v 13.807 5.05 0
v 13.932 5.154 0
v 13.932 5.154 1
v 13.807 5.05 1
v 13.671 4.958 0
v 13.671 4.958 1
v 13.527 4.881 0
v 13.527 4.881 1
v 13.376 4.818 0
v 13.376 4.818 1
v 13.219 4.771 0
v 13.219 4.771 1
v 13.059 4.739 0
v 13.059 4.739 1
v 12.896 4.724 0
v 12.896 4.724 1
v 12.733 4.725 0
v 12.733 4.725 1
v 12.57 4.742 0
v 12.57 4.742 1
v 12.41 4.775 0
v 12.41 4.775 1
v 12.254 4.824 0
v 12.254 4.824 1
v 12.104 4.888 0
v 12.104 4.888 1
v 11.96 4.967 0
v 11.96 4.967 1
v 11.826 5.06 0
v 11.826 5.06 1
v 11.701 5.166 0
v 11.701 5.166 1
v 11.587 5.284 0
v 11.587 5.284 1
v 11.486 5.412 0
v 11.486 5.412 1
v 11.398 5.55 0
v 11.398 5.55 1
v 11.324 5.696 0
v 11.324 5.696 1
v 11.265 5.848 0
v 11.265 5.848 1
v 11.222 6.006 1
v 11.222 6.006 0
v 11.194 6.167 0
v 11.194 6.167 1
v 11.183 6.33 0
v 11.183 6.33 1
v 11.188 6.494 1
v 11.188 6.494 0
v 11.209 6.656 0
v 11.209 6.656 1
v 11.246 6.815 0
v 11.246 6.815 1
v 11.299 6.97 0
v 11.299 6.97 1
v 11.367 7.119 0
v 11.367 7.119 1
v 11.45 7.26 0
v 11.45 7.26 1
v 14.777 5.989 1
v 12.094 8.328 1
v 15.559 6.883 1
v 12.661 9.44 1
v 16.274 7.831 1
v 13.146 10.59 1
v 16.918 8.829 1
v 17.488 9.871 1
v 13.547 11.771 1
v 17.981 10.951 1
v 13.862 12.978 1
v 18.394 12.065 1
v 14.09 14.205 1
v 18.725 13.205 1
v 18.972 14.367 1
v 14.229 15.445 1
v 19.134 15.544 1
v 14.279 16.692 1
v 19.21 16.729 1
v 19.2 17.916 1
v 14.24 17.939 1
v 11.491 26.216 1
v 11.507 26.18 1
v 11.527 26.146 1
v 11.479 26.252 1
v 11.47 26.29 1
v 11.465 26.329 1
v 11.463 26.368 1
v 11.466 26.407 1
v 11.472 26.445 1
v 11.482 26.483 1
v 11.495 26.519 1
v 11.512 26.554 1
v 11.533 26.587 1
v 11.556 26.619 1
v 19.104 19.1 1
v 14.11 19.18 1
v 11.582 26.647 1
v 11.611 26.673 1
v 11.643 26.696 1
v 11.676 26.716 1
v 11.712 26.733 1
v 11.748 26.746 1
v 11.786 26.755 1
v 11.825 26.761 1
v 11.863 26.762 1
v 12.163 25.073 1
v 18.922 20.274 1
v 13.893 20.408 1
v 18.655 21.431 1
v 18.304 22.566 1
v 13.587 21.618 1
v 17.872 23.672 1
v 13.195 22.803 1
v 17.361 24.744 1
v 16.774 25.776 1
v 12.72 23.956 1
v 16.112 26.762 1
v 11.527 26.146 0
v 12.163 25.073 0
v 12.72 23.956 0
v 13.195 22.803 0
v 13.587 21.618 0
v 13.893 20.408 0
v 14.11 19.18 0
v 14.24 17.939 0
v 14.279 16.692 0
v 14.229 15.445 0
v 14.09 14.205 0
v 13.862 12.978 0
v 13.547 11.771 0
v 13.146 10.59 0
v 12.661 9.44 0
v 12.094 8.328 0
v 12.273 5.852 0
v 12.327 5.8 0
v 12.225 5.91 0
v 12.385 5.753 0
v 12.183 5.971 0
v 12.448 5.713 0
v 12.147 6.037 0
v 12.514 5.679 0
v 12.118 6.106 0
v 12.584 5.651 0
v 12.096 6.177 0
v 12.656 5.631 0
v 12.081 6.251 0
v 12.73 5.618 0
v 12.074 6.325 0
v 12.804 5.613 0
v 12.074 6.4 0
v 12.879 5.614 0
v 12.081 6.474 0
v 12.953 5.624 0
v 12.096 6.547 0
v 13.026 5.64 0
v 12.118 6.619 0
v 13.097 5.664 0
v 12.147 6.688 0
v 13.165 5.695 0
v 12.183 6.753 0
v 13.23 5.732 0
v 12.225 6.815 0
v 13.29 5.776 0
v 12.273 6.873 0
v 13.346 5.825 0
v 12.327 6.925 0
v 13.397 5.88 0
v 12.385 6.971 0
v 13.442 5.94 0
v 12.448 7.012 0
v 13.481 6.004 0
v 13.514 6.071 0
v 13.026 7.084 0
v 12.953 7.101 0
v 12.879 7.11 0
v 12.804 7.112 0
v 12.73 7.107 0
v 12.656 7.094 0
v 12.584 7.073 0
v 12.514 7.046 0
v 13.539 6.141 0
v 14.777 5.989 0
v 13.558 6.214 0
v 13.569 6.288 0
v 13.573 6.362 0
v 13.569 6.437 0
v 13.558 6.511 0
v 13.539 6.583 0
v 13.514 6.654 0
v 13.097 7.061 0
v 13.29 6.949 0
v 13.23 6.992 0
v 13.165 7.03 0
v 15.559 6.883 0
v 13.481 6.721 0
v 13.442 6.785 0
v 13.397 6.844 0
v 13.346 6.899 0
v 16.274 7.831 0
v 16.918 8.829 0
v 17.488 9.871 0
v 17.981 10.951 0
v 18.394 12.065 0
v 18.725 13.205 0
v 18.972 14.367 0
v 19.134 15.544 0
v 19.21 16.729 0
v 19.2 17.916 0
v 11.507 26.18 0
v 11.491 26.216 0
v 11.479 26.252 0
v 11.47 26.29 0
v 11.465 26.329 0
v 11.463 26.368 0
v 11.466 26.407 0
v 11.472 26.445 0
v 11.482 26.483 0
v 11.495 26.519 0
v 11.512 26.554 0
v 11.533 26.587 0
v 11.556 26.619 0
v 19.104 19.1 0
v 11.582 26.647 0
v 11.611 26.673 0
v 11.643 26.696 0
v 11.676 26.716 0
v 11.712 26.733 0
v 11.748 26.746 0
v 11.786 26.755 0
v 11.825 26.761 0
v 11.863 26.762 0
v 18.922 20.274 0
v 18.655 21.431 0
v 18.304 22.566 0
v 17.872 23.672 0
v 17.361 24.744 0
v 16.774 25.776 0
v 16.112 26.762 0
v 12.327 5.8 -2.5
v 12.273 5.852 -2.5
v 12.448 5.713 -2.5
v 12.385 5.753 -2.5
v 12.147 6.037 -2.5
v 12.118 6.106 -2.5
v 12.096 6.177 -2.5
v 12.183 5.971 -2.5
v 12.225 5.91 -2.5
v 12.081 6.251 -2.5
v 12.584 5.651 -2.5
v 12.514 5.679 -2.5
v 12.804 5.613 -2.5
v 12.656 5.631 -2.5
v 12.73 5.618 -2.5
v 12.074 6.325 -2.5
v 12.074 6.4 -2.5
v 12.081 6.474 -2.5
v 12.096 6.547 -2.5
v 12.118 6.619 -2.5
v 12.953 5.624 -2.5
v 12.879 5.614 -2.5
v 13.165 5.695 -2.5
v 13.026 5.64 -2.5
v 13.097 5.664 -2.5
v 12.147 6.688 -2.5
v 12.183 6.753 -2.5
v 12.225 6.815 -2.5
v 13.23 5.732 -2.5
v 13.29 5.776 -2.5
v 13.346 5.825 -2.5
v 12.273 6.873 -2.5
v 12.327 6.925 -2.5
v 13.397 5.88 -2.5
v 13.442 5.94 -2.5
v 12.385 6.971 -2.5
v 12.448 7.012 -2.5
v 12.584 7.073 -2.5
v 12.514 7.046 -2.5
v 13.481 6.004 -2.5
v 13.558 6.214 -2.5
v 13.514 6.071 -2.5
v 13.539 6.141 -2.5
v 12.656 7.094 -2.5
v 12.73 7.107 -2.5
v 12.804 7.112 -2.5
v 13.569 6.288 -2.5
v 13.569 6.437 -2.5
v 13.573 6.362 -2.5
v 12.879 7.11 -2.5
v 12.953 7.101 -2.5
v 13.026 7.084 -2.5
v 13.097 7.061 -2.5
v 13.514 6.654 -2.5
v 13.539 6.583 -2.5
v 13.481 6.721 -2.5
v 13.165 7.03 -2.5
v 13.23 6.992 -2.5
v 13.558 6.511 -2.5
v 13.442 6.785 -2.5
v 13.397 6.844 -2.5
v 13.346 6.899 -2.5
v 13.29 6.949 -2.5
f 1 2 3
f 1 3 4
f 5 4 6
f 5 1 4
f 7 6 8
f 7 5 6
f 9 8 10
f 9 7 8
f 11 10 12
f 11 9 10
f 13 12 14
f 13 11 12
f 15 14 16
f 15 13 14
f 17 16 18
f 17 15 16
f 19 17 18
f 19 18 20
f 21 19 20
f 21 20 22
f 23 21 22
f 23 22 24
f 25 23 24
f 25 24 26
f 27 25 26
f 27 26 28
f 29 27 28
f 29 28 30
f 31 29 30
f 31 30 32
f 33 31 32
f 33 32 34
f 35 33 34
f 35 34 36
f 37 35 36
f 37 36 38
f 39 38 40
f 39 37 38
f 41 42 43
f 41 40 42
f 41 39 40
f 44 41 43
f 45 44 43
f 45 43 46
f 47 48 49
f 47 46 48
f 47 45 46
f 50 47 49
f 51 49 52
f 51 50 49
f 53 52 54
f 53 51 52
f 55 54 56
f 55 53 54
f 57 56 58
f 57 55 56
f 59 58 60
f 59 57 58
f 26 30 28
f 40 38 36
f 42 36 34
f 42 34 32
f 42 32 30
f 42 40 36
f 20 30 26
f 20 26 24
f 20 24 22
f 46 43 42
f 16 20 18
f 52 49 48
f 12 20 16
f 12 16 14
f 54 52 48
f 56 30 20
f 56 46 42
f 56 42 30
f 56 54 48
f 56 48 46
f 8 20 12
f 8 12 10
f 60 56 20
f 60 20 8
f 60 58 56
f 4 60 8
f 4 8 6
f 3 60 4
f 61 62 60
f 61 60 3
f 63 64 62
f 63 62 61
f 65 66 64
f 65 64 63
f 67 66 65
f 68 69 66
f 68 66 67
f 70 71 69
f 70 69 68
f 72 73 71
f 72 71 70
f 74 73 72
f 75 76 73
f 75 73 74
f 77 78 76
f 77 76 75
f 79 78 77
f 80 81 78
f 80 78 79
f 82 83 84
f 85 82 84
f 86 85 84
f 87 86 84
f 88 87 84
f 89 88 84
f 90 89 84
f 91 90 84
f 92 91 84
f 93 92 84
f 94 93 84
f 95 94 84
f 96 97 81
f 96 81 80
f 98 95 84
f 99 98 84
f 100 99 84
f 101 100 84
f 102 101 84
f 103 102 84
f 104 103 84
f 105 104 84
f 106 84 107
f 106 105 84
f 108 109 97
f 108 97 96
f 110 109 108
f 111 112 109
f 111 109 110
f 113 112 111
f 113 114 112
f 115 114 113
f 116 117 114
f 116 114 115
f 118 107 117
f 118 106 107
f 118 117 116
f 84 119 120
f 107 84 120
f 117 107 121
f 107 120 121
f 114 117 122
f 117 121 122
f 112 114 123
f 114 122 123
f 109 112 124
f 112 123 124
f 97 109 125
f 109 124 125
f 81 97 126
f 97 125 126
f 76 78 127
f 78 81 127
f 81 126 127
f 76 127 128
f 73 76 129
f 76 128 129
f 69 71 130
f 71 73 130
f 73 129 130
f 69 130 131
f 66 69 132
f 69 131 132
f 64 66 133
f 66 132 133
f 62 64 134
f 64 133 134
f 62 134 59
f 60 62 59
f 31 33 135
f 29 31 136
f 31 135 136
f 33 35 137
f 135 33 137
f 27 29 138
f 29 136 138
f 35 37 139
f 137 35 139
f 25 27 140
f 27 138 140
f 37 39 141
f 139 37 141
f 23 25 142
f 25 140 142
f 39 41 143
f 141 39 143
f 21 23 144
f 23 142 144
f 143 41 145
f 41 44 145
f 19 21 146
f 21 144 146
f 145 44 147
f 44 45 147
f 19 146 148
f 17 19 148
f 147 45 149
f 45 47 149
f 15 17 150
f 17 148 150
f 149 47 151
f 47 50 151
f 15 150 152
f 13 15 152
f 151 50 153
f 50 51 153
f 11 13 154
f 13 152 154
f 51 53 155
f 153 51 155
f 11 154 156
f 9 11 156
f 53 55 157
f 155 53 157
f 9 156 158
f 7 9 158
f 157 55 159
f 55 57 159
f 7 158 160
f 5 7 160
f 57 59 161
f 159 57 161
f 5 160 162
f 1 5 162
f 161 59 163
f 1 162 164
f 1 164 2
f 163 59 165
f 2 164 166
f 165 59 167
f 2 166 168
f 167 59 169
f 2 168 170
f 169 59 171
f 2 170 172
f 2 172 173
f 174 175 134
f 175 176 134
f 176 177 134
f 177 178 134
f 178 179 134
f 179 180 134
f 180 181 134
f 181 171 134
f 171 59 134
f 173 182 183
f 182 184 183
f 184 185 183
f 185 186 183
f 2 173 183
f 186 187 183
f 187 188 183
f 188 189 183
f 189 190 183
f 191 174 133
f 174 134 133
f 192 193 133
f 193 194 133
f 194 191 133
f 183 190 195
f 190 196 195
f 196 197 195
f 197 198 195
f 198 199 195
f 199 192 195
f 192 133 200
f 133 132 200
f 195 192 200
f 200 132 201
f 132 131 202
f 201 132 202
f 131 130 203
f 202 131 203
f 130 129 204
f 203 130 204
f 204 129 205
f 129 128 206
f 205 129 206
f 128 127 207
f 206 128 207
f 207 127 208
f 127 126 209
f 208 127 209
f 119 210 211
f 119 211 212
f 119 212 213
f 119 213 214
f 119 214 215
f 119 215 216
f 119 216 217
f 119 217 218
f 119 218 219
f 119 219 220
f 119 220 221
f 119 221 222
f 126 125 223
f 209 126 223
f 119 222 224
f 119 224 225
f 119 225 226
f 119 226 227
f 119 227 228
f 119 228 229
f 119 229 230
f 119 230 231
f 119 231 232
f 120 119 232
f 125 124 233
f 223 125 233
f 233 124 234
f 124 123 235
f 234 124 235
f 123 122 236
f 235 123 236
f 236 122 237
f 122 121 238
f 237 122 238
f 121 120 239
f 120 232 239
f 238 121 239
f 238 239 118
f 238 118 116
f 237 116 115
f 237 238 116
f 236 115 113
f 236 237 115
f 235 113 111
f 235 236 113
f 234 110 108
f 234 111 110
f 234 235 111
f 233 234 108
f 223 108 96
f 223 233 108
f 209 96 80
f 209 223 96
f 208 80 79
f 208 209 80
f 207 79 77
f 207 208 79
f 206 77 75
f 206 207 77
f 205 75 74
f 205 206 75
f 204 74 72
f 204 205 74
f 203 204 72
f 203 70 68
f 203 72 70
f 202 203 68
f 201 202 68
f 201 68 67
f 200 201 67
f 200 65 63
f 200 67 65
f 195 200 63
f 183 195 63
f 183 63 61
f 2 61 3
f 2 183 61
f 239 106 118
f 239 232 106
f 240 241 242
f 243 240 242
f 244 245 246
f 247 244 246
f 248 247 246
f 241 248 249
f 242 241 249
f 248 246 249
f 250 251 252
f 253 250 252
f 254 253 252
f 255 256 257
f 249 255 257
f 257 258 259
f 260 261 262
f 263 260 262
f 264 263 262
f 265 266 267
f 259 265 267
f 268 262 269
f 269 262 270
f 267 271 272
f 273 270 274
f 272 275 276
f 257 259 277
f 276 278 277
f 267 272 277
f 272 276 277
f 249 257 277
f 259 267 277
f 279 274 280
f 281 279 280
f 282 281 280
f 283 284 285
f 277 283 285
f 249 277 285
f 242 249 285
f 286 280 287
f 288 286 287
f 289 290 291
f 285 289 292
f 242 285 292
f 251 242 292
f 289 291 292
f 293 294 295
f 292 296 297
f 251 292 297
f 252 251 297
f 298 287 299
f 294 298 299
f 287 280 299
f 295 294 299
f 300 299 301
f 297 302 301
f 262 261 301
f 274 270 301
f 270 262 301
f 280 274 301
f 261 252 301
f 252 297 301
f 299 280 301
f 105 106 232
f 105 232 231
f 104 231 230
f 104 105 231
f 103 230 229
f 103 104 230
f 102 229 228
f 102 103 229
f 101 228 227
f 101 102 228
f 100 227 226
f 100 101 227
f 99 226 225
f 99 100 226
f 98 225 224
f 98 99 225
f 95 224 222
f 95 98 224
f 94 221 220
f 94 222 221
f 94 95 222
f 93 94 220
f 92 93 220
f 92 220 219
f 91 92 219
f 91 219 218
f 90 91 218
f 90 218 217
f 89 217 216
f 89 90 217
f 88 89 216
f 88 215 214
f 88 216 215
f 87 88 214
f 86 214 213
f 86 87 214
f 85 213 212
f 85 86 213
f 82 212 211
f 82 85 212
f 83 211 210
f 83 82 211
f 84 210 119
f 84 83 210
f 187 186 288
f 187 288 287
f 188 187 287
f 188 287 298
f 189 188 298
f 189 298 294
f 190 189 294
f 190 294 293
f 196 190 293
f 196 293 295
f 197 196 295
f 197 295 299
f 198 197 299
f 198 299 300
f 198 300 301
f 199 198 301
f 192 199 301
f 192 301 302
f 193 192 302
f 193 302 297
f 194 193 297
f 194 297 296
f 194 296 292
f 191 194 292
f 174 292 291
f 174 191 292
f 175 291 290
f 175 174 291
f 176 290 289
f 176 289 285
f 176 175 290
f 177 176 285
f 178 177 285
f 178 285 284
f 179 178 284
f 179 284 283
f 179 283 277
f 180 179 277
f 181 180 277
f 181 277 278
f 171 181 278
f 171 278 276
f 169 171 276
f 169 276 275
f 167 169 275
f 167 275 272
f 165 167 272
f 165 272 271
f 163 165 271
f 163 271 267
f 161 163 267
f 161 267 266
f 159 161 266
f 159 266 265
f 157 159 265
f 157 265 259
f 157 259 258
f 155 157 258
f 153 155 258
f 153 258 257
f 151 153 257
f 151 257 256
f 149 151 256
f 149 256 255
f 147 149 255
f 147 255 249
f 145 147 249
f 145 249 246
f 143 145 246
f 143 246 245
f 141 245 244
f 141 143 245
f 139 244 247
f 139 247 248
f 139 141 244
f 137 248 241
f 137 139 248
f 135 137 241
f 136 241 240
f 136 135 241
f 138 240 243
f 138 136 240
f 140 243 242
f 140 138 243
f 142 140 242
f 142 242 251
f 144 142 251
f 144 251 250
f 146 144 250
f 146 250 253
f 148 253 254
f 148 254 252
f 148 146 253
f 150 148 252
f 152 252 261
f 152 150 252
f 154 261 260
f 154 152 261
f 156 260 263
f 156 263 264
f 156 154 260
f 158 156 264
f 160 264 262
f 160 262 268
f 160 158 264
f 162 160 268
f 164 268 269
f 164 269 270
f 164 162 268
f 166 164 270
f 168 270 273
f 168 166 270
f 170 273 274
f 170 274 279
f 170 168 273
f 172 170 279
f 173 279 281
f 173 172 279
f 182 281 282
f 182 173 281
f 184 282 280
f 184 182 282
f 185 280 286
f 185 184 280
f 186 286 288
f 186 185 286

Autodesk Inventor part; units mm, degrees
ref_plane "YZ Plane" through (0, 0, 0) normal (1, 0, 0) x (0, 1, 0)
ref_plane "XZ Plane" through (0, 0, 0) normal (0, 1, 0) x (-1, 0, 0)
ref_plane "XY Plane" through (0, 0, 0) normal (0, 0, 1) x (1, 0, 0)
sketch "Sketch1" plane through (0, 0, 0) normal (0, 0, 1) x (1, 0, 0)
  arc A0 (11.4498, 7.2597) -> (11.1125, 26.7625) centre (-3.0917, 16.7625) ccw
  arc A1 (11.4498, 7.2597) -> (13.9324, 5.1544) centre (12.8228, 6.3624) ccw
  arc A2 (13.9324, 5.1544) -> (16.1125, 26.7625) centre (2.8844, 17.1831) ccw
  line L0 (11.1125, 26.7625) -> (16.1125, 26.7625)
  point P0 (0, 0)
extrude "Extrusion1" add sketch "Sketch1" along normal blind 1
sketch "Sketch2" plane through (0, 0, 1) normal (0, 0, 1) x (1, 0, 0)
  arc A0 (11.4498, 7.2597) -> (11.1125, 26.7625) centre (-3.0917, 16.7625) ccw projected
  arc A1 (11.4498, 7.2597) -> (13.9324, 5.1544) centre (12.8228, 6.3624) ccw projected
  arc A2 (13.9324, 5.1544) -> (16.1125, 26.7625) centre (2.8844, 17.1831) ccw projected
  line L0 (16.1125, 26.7625) -> (11.1125, 26.7625) projected
  circle A3 centre (12.8228, 6.3624) radius 0.75
  point P0 (0, 0)
  dimension "d5" = 1.5
extrude "Extrusion2" add sketch "Sketch2" against normal blind 3.5 contours A3
fillet "Fillet1" radius 0.4 1 edges at (11.1125, 26.7625, 0.5)
properties material "Liga de Nickel-Copper 400"
